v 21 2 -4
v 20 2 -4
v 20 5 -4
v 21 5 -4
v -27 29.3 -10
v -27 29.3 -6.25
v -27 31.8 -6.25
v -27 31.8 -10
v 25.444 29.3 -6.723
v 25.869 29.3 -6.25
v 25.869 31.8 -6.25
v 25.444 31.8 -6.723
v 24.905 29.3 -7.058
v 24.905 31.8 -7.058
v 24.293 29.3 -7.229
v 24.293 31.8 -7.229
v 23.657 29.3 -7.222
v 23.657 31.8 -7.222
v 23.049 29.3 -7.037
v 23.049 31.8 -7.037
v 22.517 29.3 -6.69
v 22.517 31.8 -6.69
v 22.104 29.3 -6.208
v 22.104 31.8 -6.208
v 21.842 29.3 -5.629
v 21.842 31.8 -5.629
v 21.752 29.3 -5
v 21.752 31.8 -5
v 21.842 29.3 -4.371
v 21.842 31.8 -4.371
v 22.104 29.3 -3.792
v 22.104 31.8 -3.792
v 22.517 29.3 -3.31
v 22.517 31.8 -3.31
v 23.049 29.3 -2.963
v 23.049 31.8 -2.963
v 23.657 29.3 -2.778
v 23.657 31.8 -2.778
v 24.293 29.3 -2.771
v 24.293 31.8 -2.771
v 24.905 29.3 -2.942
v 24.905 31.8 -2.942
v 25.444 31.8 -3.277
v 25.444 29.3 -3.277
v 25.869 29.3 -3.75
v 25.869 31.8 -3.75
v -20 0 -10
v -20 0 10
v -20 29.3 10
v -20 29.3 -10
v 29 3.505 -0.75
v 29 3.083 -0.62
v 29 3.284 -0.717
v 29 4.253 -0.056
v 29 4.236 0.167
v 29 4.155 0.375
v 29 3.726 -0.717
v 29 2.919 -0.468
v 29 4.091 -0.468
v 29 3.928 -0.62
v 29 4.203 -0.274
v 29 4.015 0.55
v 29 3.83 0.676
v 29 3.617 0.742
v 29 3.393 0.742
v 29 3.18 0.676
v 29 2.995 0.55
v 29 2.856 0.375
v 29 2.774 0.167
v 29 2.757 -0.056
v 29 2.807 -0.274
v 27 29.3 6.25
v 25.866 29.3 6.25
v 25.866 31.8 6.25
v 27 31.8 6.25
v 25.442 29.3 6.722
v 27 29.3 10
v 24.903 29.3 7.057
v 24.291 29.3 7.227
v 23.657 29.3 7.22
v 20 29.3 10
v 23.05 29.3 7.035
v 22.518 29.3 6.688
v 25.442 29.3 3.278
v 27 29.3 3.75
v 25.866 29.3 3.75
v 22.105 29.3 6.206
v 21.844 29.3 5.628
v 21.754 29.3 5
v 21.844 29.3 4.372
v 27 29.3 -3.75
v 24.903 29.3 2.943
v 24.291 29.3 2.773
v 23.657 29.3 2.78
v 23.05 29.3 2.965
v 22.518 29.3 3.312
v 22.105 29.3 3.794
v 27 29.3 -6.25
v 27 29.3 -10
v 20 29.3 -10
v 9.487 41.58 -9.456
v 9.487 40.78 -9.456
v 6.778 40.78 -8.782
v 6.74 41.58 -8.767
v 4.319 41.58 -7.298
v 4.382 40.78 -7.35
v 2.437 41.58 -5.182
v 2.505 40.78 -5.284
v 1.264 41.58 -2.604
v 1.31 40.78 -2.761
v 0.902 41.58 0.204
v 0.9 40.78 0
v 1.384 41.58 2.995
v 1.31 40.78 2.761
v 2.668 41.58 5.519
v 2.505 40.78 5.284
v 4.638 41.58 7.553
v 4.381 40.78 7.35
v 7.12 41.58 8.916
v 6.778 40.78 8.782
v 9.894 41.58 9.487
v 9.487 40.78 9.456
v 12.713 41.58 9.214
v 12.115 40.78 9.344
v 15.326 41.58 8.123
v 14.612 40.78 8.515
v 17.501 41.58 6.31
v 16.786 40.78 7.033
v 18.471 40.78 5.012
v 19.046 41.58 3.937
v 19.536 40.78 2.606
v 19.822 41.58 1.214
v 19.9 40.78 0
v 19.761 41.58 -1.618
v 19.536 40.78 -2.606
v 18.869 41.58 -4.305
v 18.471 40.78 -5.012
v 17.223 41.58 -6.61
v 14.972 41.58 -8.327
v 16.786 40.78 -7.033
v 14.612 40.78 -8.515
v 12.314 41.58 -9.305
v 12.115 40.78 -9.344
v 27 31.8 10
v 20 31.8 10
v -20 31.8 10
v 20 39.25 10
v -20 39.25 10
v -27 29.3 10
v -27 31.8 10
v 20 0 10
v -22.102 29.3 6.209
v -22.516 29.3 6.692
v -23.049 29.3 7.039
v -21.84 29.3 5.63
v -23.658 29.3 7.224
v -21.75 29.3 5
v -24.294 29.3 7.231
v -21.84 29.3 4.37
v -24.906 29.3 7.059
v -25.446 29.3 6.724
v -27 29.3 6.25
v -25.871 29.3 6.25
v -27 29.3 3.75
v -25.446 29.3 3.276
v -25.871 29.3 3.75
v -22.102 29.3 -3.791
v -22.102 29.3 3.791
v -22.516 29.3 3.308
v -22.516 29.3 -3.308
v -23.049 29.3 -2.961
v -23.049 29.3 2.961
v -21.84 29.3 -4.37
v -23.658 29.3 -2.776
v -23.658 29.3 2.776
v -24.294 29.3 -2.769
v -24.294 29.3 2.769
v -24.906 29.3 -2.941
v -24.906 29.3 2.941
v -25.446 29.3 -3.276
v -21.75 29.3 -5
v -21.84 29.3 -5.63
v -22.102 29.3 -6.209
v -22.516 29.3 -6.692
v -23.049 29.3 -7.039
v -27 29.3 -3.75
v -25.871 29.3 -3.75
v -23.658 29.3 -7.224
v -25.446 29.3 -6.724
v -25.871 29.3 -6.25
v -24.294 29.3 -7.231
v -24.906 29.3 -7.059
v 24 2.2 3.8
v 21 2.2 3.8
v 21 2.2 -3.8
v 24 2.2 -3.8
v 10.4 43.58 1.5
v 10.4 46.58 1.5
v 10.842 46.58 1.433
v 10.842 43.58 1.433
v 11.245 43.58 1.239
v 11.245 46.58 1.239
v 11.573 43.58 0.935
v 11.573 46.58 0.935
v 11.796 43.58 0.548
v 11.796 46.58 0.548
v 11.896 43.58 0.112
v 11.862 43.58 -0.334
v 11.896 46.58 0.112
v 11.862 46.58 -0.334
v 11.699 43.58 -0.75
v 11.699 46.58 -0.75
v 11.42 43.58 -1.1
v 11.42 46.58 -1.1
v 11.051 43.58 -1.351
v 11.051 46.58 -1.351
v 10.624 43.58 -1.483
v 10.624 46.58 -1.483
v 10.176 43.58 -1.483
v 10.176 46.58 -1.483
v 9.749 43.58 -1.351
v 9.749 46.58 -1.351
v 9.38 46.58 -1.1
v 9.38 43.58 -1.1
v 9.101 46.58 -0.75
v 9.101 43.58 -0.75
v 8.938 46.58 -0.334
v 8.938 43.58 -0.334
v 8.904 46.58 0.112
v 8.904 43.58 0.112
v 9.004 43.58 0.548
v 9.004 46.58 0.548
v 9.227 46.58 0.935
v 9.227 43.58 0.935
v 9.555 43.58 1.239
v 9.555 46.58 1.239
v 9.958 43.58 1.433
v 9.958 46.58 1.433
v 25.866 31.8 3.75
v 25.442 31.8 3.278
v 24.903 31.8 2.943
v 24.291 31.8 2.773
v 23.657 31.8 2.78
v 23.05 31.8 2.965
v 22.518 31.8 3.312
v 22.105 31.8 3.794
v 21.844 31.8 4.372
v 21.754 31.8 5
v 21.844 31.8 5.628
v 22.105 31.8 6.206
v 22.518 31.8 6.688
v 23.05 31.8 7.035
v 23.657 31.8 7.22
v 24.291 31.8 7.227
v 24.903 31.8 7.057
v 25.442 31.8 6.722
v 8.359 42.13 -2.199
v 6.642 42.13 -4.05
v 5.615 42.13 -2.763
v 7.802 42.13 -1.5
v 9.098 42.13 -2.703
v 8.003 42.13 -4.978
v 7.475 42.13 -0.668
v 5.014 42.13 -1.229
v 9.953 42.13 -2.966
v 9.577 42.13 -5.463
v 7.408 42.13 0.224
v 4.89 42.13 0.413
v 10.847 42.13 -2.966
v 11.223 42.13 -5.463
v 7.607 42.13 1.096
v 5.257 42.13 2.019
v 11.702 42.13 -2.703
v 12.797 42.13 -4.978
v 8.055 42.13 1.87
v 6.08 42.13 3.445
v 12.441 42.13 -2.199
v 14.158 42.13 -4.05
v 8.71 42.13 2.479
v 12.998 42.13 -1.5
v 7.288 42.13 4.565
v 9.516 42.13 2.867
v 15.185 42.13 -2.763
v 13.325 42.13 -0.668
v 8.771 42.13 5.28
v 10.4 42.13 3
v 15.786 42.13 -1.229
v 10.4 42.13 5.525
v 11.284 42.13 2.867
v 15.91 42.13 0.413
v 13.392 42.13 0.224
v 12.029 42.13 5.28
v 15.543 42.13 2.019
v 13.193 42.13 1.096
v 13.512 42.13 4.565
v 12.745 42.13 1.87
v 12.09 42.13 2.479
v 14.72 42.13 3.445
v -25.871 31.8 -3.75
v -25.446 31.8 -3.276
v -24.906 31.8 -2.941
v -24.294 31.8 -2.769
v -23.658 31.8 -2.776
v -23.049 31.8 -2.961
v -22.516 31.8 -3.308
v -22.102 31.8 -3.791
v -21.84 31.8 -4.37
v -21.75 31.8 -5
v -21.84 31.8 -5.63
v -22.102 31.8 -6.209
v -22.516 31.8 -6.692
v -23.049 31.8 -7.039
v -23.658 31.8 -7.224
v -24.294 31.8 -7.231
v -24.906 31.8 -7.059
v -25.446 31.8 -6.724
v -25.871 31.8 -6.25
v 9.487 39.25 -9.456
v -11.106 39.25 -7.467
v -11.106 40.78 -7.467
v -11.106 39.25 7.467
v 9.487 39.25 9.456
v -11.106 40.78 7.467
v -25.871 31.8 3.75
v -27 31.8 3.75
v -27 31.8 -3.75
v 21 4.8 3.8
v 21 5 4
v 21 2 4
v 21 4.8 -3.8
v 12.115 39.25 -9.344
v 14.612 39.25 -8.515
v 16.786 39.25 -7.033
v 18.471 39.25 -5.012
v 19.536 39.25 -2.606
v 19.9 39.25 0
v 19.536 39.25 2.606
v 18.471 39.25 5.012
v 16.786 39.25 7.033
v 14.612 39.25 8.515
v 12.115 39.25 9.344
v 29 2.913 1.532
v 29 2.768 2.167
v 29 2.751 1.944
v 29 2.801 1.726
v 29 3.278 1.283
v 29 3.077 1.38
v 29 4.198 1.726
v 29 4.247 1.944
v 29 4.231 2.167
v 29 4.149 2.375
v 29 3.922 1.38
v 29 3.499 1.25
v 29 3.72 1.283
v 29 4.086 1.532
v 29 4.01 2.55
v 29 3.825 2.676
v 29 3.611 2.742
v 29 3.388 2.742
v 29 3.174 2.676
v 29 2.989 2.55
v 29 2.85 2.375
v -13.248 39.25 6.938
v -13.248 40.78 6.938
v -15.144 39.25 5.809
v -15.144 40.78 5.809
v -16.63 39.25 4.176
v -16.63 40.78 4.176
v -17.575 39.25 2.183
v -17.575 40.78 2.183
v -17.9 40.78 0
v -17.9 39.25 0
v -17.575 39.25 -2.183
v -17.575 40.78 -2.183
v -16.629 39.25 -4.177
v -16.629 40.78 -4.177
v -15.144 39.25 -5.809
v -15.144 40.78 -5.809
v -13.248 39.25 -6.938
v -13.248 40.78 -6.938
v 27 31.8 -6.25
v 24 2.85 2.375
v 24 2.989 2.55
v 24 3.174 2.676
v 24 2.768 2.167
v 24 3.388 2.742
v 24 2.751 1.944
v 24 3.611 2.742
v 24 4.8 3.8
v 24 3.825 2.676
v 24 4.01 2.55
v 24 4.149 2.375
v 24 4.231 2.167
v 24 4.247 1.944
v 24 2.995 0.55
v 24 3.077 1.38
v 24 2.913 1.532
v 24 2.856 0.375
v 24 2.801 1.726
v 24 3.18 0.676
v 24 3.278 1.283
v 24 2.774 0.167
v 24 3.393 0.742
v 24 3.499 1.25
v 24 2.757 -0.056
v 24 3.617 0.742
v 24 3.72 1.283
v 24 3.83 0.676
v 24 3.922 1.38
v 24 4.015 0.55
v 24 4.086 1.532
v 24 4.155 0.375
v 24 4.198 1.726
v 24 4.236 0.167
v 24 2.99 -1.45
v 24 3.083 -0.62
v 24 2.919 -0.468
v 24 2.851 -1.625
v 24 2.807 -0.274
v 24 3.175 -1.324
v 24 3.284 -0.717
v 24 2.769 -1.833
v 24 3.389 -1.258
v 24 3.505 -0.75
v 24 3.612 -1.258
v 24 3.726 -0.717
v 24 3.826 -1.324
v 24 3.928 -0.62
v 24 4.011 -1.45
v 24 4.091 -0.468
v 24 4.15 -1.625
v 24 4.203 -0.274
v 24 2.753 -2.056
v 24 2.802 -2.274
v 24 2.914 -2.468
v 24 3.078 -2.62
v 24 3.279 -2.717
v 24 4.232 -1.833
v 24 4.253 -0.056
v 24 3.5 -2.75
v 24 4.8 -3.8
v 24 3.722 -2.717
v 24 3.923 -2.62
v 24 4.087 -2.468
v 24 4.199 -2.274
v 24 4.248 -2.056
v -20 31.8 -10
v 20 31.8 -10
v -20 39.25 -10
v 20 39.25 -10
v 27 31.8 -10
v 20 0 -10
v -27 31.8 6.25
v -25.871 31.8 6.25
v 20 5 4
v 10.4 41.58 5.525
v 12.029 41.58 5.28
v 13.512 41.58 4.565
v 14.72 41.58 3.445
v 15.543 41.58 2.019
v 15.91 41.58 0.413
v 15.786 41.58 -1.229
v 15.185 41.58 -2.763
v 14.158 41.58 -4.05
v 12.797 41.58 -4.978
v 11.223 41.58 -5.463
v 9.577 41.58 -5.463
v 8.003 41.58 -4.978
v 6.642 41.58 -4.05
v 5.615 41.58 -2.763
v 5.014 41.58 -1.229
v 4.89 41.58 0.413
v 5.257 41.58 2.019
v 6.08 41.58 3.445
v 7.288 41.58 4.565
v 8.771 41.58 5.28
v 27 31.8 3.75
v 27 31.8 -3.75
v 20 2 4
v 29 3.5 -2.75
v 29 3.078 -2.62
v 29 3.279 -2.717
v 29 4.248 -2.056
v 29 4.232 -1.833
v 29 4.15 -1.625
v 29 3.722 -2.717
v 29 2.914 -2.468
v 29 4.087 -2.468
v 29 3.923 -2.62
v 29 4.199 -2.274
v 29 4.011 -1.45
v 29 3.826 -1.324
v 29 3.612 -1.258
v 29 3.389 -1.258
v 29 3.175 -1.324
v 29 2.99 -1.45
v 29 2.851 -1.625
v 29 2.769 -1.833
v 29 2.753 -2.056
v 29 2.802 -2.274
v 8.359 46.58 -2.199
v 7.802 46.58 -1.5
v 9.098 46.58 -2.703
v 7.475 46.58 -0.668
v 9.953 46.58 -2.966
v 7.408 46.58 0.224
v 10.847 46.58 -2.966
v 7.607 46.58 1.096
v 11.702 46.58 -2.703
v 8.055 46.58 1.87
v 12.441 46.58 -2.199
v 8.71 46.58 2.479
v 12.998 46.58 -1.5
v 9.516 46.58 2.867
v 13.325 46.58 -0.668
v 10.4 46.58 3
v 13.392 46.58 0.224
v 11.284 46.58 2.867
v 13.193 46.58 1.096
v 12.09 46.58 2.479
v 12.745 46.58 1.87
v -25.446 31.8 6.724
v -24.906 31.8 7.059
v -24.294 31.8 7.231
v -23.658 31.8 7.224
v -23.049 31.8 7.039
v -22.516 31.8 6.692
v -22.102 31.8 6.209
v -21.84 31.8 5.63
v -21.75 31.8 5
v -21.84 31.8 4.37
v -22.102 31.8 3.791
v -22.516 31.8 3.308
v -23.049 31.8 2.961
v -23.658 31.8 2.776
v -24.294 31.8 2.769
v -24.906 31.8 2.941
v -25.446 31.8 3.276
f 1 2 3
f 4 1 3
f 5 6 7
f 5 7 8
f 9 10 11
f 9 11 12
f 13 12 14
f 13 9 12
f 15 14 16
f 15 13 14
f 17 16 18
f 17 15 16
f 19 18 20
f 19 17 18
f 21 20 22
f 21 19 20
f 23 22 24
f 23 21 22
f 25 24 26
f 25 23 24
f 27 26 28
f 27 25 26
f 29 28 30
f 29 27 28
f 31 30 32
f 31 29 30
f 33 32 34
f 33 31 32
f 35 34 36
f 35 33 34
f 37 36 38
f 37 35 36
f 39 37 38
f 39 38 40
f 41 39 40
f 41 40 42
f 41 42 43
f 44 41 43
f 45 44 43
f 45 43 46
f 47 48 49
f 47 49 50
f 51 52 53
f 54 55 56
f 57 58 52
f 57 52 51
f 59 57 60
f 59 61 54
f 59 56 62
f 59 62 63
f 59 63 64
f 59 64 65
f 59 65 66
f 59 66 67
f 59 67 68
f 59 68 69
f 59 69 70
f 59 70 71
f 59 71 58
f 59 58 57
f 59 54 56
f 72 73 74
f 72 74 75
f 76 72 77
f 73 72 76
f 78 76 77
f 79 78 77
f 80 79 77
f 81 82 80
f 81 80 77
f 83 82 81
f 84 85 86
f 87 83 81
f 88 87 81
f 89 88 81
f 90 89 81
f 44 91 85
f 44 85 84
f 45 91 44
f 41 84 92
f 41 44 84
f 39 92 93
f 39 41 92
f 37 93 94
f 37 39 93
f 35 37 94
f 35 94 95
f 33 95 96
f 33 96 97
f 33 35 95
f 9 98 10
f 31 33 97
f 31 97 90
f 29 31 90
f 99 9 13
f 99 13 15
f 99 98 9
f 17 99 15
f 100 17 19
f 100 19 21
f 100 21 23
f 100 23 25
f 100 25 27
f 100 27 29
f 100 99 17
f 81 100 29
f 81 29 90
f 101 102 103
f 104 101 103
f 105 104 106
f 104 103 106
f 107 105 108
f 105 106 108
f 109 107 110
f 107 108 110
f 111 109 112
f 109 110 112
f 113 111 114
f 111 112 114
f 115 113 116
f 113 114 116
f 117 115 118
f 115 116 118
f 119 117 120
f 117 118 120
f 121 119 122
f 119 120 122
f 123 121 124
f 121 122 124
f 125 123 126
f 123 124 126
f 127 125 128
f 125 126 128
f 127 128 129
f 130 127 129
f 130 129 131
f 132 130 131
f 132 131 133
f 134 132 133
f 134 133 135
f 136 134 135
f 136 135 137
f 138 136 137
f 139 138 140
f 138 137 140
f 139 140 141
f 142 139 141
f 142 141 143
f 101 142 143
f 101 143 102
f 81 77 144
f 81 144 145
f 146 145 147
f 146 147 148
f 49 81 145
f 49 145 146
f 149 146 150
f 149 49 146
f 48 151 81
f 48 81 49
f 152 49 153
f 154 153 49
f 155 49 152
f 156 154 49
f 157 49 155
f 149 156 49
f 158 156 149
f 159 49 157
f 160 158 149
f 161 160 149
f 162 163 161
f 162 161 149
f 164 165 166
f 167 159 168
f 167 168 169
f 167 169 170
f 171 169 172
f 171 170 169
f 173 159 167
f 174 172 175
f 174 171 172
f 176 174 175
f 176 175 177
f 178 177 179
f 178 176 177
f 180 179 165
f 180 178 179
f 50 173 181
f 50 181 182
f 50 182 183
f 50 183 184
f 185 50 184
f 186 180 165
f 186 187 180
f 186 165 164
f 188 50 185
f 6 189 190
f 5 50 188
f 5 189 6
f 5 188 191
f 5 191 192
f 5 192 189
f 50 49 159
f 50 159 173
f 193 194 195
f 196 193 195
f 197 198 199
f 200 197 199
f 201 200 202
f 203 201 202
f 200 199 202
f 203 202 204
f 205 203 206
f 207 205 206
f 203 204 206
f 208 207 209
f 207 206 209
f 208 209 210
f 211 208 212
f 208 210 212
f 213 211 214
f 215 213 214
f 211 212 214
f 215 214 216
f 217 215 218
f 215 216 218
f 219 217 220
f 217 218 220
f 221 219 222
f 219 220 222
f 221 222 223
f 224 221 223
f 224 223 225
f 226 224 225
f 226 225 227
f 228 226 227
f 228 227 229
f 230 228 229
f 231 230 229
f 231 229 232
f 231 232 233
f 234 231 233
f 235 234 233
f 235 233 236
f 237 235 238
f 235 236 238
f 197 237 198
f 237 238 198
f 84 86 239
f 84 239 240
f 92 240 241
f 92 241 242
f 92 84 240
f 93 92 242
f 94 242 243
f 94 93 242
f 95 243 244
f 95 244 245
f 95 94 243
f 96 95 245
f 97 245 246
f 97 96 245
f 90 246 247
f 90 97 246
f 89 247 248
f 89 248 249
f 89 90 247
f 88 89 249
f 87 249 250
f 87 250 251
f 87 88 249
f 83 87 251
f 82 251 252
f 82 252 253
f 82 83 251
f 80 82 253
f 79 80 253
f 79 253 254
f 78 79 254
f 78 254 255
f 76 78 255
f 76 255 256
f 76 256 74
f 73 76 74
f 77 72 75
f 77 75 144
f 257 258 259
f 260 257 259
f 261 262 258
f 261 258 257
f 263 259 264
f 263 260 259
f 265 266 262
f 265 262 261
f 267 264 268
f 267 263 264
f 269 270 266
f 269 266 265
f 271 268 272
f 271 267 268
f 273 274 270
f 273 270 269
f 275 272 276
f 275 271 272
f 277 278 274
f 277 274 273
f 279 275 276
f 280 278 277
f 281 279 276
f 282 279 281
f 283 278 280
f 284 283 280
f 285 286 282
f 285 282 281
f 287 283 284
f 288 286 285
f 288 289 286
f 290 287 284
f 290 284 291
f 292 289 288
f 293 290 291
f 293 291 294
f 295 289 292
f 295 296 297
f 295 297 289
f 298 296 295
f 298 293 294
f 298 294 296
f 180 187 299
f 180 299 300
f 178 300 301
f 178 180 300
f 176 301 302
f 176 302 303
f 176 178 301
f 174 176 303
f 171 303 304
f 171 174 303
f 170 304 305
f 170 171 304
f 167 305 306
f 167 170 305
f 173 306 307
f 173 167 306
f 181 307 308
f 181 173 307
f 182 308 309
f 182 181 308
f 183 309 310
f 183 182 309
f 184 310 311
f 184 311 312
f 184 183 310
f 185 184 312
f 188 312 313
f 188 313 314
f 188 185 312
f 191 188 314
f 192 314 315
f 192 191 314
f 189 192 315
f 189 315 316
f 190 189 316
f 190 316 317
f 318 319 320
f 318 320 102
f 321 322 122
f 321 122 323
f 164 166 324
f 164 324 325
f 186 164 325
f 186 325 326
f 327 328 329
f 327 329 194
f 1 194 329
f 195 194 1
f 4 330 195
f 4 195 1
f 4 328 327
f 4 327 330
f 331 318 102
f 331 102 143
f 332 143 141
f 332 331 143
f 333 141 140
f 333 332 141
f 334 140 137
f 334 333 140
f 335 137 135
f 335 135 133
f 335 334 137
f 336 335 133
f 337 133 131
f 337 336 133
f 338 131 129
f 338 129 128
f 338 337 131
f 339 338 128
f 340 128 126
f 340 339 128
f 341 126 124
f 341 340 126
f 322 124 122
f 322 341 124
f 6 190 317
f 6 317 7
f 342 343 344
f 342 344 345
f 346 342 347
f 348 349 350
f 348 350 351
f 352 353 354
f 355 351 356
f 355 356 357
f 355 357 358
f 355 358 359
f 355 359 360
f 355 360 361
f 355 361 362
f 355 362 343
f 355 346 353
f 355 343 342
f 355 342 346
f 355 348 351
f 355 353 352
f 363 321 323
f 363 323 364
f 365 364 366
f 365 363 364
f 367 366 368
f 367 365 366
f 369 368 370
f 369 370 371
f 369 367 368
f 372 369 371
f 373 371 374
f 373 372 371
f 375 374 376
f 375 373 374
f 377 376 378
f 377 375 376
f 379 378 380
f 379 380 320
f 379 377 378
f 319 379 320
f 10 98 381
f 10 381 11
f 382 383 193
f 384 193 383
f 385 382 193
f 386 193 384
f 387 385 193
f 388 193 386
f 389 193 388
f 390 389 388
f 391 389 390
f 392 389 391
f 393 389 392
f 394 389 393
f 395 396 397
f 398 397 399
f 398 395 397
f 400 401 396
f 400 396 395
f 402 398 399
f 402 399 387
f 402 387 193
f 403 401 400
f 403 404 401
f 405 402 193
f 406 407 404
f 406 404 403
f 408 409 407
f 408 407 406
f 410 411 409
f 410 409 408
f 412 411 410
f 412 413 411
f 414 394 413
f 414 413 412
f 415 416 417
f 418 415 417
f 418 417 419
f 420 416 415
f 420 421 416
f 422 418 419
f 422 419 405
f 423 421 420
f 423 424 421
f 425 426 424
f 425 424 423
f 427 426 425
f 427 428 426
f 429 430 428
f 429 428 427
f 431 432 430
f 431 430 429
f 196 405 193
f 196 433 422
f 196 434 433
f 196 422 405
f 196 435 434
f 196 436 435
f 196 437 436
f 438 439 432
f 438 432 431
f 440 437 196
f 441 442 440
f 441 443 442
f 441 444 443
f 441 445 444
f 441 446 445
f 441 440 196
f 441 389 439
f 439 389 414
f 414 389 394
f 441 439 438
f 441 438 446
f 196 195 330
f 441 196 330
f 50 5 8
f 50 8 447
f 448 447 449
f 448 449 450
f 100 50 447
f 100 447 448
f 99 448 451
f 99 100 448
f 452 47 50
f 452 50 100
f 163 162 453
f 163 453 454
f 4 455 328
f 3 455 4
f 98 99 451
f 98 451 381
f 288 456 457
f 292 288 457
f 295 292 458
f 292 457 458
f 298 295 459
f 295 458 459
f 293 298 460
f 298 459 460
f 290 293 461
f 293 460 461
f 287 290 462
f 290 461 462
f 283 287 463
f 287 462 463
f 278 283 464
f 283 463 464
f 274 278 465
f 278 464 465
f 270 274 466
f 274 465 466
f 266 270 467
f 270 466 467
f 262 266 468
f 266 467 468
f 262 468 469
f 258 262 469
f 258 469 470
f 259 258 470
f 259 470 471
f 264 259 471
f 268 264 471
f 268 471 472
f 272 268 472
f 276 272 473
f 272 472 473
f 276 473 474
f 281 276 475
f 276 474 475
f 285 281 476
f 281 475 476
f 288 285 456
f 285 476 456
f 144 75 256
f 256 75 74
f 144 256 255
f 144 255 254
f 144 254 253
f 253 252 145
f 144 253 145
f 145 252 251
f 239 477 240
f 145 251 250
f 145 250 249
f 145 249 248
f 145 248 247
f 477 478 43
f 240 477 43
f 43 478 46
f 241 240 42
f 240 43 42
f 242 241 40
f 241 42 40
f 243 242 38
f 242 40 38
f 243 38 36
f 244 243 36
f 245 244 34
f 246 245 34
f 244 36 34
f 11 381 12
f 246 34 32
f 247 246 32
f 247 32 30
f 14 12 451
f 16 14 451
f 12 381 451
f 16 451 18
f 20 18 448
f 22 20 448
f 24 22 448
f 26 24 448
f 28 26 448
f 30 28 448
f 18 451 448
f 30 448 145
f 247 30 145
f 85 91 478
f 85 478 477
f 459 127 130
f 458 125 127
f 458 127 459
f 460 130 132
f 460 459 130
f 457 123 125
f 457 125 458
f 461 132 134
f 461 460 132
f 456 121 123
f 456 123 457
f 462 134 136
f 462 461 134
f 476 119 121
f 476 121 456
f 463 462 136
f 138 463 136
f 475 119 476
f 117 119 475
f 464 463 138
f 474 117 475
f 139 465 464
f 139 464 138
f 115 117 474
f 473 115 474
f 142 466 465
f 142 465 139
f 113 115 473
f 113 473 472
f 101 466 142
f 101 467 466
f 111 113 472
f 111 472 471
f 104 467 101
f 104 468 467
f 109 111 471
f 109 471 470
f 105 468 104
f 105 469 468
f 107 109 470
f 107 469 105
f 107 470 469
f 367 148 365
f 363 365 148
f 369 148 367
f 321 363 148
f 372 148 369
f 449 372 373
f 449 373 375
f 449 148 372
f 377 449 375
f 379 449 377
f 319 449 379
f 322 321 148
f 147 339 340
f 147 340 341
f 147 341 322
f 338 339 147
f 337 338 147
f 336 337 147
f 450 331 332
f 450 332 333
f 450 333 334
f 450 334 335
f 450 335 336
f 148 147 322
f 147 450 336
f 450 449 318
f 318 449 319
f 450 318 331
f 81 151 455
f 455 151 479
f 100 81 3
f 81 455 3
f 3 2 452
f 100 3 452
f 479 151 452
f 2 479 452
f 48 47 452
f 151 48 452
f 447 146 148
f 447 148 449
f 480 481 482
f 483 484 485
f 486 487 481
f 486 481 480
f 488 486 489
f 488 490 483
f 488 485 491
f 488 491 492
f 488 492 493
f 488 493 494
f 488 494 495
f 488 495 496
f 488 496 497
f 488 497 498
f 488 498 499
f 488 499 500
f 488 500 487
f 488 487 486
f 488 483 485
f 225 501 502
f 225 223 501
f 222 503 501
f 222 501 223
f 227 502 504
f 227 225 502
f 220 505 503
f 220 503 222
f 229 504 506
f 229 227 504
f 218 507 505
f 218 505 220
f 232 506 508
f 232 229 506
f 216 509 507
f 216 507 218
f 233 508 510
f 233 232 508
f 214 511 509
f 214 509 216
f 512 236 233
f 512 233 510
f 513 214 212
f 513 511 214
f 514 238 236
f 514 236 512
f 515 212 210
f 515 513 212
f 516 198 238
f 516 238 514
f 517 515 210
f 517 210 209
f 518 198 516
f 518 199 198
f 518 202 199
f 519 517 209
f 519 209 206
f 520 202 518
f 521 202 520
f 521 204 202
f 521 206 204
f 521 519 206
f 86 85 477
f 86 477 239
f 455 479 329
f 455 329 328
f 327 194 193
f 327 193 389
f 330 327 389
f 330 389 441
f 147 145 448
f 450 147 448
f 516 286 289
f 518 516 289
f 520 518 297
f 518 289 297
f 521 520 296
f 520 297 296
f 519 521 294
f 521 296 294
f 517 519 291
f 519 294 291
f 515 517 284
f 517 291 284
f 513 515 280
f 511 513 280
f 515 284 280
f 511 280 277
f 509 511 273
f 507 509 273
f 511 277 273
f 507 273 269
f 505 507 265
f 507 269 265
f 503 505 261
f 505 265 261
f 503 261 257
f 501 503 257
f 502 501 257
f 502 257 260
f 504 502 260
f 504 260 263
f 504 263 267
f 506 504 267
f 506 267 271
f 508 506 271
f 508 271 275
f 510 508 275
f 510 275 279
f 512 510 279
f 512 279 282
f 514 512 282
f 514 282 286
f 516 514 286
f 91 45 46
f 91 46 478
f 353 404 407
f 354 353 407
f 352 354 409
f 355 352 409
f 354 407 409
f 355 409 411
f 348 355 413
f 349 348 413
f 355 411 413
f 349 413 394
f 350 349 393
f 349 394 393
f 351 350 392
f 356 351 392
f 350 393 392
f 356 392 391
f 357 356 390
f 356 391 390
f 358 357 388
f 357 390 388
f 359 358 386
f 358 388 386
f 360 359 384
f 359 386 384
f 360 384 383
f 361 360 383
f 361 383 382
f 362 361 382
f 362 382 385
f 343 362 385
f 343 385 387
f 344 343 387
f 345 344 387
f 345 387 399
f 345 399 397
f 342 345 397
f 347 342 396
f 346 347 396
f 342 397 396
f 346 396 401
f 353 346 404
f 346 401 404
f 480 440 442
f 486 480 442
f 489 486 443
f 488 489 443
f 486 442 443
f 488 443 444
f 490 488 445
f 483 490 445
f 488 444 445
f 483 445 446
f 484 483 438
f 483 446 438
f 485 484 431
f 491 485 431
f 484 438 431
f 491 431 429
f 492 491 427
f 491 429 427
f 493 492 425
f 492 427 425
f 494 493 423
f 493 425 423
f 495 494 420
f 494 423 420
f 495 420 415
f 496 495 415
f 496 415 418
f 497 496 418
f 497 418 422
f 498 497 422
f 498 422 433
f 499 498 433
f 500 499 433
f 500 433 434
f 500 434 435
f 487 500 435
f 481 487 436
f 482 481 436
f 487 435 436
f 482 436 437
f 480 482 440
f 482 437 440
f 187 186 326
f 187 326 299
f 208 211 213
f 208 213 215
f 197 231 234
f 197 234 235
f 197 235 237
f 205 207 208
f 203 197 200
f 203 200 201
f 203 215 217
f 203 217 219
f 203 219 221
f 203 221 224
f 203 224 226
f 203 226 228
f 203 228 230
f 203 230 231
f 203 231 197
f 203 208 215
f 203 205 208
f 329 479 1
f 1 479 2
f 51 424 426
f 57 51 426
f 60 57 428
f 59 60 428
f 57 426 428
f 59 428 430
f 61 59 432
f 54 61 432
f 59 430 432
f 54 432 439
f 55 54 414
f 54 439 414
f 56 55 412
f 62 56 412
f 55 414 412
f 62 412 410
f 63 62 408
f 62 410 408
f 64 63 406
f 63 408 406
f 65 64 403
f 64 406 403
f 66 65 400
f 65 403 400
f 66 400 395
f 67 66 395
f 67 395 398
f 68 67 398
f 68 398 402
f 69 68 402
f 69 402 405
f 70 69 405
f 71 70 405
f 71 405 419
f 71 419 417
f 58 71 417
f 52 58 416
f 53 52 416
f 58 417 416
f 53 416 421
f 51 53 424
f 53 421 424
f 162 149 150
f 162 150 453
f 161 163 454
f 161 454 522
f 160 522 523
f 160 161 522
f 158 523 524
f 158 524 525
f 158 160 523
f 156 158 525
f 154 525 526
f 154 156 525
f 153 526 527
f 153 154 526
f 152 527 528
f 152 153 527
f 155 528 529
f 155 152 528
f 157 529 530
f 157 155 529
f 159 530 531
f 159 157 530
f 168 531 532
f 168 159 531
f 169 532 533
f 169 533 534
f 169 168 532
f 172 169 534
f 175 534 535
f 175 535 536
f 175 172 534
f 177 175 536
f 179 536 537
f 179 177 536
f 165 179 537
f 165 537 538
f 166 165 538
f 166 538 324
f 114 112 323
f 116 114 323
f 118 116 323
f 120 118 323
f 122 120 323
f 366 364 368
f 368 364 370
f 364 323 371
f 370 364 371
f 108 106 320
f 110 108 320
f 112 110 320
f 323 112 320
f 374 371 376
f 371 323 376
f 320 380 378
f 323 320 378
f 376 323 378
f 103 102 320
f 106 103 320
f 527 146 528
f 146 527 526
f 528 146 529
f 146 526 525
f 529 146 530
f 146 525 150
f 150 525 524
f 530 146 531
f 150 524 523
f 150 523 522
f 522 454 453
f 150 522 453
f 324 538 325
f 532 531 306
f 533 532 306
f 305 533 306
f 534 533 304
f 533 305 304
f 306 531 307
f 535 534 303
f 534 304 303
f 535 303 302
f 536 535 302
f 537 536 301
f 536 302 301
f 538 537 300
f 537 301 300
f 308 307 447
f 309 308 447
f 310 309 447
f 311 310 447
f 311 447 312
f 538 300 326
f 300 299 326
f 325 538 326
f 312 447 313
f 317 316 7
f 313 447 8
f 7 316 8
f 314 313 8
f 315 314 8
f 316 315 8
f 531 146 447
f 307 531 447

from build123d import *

# Parameters (mm, degrees)
SKETCH_1_W          = 40
SKETCH_1_H          = 20
EXTRUDE_1_DEPTH     = 29.3
EXTRUDE_2_DEPTH     = 2.5
SKETCH_3_W          = 40
SKETCH_3_H          = 20
EXTRUDE_3_DEPTH     = 7.45
EXTRUDE_4_DEPTH     = 1.53
SKETCH_5_R          = 9.5
EXTRUDE_5_DEPTH     = 0.8
SKETCH_6_R          = 3
EXTRUDE_6_DEPTH     = 5
SKETCH_7_W          = 8
SKETCH_7_H          = 3
EXTRUDE_7_DEPTH     = 1
SKETCH_8_W          = 7.6
SKETCH_8_H          = 2.6
EXTRUDE_8_DEPTH     = 3
SKETCH_9_R          = 0.75
EXTRUDE_9_DEPTH     = 5
SKETCH_10_R         = 1.5
CUT_EXTRUDE_1_DEPTH = 3
SKETCH_11_R         = 5.525
EXTRUDE_11_DEPTH    = 0.55


with BuildPart() as part:
    # 스케치1 → 보스-돌출1 (new body)
    with BuildSketch(Plane(origin=(0, 0, 0), x_dir=(1, 0, 0), z_dir=(0, 1, 0))):
        Rectangle(SKETCH_1_W, SKETCH_1_H)
    extrude(amount=EXTRUDE_1_DEPTH)

    # 스케치2 → 보스-돌출2 (add)
    with BuildSketch(Plane(origin=(0, 29.3, 0), x_dir=(1, 0, 0), z_dir=(0, 1, 0))):
        with BuildLine():
            Line((-27, 10), (27, 10))
            Line((27, 10), (27, 6.25))
            Line((27, 6.25), (25.868643032, 6.25))
            ThreePointArc((25.868643032, 6.25), (21.751817004, 5), (25.868643032, 3.75))
            Line((25.868643032, 3.75), (27, 3.75))
            Line((27, 3.75), (27, -3.75))
            Line((27, -3.75), (25.866173833, -3.75))
            ThreePointArc((25.866173833, -3.75), (21.753868932, -5), (25.866173833, -6.25))
            Line((25.866173833, -6.25), (27, -6.25))
            Line((27, -6.25), (27, -10))
            Line((27, -10), (-27, -10))
            Line((-27, -10), (-27, -6.25))
            Line((-27, -6.25), (-25.870828693, -6.25))
            ThreePointArc((-25.870828693, -6.25), (-21.75, -5), (-25.870828693, -3.75))
            Line((-25.870828693, -3.75), (-27, -3.75))
            Line((-27, -3.75), (-27, 3.75))
            Line((-27, 3.75), (-25.870828693, 3.75))
            ThreePointArc((-25.870828693, 3.75), (-21.75, 5), (-25.870828693, 6.25))
            Line((-25.870828693, 6.25), (-27, 6.25))
            Line((-27, 6.25), (-27, 10))
        make_face()
    extrude(amount=EXTRUDE_2_DEPTH)

    # 스케치3 → 보스-돌출3 (add)
    with BuildSketch(Plane(origin=(0, 31.8, 0), x_dir=(1, 0, 0), z_dir=(0, 1, 0))):
        Rectangle(SKETCH_3_W, SKETCH_3_H)
    extrude(amount=EXTRUDE_3_DEPTH)

    # 스케치4 → 보스-돌출4 (add)
    with BuildSketch(Plane(origin=(0, 39.25, 0), x_dir=(1, 0, 0), z_dir=(0, 1, 0))):
        with BuildLine():
            Line((-11.105930899, 7.466746492), (9.486550883, 9.4559828))
            ThreePointArc((9.486550883, 9.4559828), (19.9, -1.9624e-05), (9.486511816, -9.455979026))
            Line((9.486511816, -9.455979026), (-11.105960469, -7.466657767))
            ThreePointArc((-11.105960469, -7.466657767), (-17.9, 5.7816e-05), (-11.105930899, 7.466746492))
        make_face()
    extrude(amount=EXTRUDE_4_DEPTH)

    # 스케치5 → 보스-돌출5 (add)
    with BuildSketch(Plane(origin=(0, 40.78, 0), x_dir=(1, 0, 0), z_dir=(0, 1, 0))):
        with Locations(Location((10.4, 0, 0), (0, 0, 95.517659112))):
            Circle(SKETCH_5_R)
    extrude(amount=EXTRUDE_5_DEPTH)

    # 스케치6 → 보스-돌출6 (add)
    with BuildSketch(Plane(origin=(0, 41.58, 0), x_dir=(1, 0, 0), z_dir=(0, 1, 0))):
        with Locations(Location((10.4, 0, 0), (0, 0, 270))):
            Circle(SKETCH_6_R)
    extrude(amount=EXTRUDE_6_DEPTH)

    # 스케치7 → 보스-돌출7 (add)
    with BuildSketch(Plane(origin=(20, 0, 0), x_dir=(0, 0, -1), z_dir=(1, 0, 0))):
        with Locations((0, 3.5)):
            Rectangle(SKETCH_7_W, SKETCH_7_H)
    extrude(amount=EXTRUDE_7_DEPTH)

    # 스케치8 → 보스-돌출8 (add)
    with BuildSketch(Plane(origin=(21, 0, 0), x_dir=(0, 0, -1), z_dir=(1, 0, 0))):
        with Locations((0, 3.5)):
            Rectangle(SKETCH_8_W, SKETCH_8_H)
    extrude(amount=EXTRUDE_8_DEPTH)

    # 스케치9 → 보스-돌출9 (add)
    with BuildSketch(Plane(origin=(24, 0, 0), x_dir=(0, 0, -1), z_dir=(1, 0, 0))):
        with Locations((0, 3.505070748)):
            Circle(SKETCH_9_R)
        with Locations((-1.999991967, 3.499402084)):
            Circle(SKETCH_9_R)
        with Locations((1.99999474, 3.500483844)):
            Circle(SKETCH_9_R)
    extrude(amount=EXTRUDE_9_DEPTH)

    # 스케치10 → 컷-돌출1 (cut)
    with BuildSketch(Plane(origin=(0, 46.58, 0), x_dir=(1, 0, 0), z_dir=(0, 1, 0))):
        with Locations(Location((10.4, 0, 0), (0, 0, 270))):
            Circle(SKETCH_10_R)
    extrude(amount=-CUT_EXTRUDE_1_DEPTH, mode=Mode.SUBTRACT)

    # 스케치11 → 보스-돌출11 (add)
    with BuildSketch(Plane(origin=(0, 41.58, 0), x_dir=(1, 0, 0), z_dir=(0, 1, 0))):
        with Locations(Location((10.4, 0, 0), (0, 0, 270))):
            Circle(SKETCH_11_R)
    extrude(amount=EXTRUDE_11_DEPTH)


solid = part.part
